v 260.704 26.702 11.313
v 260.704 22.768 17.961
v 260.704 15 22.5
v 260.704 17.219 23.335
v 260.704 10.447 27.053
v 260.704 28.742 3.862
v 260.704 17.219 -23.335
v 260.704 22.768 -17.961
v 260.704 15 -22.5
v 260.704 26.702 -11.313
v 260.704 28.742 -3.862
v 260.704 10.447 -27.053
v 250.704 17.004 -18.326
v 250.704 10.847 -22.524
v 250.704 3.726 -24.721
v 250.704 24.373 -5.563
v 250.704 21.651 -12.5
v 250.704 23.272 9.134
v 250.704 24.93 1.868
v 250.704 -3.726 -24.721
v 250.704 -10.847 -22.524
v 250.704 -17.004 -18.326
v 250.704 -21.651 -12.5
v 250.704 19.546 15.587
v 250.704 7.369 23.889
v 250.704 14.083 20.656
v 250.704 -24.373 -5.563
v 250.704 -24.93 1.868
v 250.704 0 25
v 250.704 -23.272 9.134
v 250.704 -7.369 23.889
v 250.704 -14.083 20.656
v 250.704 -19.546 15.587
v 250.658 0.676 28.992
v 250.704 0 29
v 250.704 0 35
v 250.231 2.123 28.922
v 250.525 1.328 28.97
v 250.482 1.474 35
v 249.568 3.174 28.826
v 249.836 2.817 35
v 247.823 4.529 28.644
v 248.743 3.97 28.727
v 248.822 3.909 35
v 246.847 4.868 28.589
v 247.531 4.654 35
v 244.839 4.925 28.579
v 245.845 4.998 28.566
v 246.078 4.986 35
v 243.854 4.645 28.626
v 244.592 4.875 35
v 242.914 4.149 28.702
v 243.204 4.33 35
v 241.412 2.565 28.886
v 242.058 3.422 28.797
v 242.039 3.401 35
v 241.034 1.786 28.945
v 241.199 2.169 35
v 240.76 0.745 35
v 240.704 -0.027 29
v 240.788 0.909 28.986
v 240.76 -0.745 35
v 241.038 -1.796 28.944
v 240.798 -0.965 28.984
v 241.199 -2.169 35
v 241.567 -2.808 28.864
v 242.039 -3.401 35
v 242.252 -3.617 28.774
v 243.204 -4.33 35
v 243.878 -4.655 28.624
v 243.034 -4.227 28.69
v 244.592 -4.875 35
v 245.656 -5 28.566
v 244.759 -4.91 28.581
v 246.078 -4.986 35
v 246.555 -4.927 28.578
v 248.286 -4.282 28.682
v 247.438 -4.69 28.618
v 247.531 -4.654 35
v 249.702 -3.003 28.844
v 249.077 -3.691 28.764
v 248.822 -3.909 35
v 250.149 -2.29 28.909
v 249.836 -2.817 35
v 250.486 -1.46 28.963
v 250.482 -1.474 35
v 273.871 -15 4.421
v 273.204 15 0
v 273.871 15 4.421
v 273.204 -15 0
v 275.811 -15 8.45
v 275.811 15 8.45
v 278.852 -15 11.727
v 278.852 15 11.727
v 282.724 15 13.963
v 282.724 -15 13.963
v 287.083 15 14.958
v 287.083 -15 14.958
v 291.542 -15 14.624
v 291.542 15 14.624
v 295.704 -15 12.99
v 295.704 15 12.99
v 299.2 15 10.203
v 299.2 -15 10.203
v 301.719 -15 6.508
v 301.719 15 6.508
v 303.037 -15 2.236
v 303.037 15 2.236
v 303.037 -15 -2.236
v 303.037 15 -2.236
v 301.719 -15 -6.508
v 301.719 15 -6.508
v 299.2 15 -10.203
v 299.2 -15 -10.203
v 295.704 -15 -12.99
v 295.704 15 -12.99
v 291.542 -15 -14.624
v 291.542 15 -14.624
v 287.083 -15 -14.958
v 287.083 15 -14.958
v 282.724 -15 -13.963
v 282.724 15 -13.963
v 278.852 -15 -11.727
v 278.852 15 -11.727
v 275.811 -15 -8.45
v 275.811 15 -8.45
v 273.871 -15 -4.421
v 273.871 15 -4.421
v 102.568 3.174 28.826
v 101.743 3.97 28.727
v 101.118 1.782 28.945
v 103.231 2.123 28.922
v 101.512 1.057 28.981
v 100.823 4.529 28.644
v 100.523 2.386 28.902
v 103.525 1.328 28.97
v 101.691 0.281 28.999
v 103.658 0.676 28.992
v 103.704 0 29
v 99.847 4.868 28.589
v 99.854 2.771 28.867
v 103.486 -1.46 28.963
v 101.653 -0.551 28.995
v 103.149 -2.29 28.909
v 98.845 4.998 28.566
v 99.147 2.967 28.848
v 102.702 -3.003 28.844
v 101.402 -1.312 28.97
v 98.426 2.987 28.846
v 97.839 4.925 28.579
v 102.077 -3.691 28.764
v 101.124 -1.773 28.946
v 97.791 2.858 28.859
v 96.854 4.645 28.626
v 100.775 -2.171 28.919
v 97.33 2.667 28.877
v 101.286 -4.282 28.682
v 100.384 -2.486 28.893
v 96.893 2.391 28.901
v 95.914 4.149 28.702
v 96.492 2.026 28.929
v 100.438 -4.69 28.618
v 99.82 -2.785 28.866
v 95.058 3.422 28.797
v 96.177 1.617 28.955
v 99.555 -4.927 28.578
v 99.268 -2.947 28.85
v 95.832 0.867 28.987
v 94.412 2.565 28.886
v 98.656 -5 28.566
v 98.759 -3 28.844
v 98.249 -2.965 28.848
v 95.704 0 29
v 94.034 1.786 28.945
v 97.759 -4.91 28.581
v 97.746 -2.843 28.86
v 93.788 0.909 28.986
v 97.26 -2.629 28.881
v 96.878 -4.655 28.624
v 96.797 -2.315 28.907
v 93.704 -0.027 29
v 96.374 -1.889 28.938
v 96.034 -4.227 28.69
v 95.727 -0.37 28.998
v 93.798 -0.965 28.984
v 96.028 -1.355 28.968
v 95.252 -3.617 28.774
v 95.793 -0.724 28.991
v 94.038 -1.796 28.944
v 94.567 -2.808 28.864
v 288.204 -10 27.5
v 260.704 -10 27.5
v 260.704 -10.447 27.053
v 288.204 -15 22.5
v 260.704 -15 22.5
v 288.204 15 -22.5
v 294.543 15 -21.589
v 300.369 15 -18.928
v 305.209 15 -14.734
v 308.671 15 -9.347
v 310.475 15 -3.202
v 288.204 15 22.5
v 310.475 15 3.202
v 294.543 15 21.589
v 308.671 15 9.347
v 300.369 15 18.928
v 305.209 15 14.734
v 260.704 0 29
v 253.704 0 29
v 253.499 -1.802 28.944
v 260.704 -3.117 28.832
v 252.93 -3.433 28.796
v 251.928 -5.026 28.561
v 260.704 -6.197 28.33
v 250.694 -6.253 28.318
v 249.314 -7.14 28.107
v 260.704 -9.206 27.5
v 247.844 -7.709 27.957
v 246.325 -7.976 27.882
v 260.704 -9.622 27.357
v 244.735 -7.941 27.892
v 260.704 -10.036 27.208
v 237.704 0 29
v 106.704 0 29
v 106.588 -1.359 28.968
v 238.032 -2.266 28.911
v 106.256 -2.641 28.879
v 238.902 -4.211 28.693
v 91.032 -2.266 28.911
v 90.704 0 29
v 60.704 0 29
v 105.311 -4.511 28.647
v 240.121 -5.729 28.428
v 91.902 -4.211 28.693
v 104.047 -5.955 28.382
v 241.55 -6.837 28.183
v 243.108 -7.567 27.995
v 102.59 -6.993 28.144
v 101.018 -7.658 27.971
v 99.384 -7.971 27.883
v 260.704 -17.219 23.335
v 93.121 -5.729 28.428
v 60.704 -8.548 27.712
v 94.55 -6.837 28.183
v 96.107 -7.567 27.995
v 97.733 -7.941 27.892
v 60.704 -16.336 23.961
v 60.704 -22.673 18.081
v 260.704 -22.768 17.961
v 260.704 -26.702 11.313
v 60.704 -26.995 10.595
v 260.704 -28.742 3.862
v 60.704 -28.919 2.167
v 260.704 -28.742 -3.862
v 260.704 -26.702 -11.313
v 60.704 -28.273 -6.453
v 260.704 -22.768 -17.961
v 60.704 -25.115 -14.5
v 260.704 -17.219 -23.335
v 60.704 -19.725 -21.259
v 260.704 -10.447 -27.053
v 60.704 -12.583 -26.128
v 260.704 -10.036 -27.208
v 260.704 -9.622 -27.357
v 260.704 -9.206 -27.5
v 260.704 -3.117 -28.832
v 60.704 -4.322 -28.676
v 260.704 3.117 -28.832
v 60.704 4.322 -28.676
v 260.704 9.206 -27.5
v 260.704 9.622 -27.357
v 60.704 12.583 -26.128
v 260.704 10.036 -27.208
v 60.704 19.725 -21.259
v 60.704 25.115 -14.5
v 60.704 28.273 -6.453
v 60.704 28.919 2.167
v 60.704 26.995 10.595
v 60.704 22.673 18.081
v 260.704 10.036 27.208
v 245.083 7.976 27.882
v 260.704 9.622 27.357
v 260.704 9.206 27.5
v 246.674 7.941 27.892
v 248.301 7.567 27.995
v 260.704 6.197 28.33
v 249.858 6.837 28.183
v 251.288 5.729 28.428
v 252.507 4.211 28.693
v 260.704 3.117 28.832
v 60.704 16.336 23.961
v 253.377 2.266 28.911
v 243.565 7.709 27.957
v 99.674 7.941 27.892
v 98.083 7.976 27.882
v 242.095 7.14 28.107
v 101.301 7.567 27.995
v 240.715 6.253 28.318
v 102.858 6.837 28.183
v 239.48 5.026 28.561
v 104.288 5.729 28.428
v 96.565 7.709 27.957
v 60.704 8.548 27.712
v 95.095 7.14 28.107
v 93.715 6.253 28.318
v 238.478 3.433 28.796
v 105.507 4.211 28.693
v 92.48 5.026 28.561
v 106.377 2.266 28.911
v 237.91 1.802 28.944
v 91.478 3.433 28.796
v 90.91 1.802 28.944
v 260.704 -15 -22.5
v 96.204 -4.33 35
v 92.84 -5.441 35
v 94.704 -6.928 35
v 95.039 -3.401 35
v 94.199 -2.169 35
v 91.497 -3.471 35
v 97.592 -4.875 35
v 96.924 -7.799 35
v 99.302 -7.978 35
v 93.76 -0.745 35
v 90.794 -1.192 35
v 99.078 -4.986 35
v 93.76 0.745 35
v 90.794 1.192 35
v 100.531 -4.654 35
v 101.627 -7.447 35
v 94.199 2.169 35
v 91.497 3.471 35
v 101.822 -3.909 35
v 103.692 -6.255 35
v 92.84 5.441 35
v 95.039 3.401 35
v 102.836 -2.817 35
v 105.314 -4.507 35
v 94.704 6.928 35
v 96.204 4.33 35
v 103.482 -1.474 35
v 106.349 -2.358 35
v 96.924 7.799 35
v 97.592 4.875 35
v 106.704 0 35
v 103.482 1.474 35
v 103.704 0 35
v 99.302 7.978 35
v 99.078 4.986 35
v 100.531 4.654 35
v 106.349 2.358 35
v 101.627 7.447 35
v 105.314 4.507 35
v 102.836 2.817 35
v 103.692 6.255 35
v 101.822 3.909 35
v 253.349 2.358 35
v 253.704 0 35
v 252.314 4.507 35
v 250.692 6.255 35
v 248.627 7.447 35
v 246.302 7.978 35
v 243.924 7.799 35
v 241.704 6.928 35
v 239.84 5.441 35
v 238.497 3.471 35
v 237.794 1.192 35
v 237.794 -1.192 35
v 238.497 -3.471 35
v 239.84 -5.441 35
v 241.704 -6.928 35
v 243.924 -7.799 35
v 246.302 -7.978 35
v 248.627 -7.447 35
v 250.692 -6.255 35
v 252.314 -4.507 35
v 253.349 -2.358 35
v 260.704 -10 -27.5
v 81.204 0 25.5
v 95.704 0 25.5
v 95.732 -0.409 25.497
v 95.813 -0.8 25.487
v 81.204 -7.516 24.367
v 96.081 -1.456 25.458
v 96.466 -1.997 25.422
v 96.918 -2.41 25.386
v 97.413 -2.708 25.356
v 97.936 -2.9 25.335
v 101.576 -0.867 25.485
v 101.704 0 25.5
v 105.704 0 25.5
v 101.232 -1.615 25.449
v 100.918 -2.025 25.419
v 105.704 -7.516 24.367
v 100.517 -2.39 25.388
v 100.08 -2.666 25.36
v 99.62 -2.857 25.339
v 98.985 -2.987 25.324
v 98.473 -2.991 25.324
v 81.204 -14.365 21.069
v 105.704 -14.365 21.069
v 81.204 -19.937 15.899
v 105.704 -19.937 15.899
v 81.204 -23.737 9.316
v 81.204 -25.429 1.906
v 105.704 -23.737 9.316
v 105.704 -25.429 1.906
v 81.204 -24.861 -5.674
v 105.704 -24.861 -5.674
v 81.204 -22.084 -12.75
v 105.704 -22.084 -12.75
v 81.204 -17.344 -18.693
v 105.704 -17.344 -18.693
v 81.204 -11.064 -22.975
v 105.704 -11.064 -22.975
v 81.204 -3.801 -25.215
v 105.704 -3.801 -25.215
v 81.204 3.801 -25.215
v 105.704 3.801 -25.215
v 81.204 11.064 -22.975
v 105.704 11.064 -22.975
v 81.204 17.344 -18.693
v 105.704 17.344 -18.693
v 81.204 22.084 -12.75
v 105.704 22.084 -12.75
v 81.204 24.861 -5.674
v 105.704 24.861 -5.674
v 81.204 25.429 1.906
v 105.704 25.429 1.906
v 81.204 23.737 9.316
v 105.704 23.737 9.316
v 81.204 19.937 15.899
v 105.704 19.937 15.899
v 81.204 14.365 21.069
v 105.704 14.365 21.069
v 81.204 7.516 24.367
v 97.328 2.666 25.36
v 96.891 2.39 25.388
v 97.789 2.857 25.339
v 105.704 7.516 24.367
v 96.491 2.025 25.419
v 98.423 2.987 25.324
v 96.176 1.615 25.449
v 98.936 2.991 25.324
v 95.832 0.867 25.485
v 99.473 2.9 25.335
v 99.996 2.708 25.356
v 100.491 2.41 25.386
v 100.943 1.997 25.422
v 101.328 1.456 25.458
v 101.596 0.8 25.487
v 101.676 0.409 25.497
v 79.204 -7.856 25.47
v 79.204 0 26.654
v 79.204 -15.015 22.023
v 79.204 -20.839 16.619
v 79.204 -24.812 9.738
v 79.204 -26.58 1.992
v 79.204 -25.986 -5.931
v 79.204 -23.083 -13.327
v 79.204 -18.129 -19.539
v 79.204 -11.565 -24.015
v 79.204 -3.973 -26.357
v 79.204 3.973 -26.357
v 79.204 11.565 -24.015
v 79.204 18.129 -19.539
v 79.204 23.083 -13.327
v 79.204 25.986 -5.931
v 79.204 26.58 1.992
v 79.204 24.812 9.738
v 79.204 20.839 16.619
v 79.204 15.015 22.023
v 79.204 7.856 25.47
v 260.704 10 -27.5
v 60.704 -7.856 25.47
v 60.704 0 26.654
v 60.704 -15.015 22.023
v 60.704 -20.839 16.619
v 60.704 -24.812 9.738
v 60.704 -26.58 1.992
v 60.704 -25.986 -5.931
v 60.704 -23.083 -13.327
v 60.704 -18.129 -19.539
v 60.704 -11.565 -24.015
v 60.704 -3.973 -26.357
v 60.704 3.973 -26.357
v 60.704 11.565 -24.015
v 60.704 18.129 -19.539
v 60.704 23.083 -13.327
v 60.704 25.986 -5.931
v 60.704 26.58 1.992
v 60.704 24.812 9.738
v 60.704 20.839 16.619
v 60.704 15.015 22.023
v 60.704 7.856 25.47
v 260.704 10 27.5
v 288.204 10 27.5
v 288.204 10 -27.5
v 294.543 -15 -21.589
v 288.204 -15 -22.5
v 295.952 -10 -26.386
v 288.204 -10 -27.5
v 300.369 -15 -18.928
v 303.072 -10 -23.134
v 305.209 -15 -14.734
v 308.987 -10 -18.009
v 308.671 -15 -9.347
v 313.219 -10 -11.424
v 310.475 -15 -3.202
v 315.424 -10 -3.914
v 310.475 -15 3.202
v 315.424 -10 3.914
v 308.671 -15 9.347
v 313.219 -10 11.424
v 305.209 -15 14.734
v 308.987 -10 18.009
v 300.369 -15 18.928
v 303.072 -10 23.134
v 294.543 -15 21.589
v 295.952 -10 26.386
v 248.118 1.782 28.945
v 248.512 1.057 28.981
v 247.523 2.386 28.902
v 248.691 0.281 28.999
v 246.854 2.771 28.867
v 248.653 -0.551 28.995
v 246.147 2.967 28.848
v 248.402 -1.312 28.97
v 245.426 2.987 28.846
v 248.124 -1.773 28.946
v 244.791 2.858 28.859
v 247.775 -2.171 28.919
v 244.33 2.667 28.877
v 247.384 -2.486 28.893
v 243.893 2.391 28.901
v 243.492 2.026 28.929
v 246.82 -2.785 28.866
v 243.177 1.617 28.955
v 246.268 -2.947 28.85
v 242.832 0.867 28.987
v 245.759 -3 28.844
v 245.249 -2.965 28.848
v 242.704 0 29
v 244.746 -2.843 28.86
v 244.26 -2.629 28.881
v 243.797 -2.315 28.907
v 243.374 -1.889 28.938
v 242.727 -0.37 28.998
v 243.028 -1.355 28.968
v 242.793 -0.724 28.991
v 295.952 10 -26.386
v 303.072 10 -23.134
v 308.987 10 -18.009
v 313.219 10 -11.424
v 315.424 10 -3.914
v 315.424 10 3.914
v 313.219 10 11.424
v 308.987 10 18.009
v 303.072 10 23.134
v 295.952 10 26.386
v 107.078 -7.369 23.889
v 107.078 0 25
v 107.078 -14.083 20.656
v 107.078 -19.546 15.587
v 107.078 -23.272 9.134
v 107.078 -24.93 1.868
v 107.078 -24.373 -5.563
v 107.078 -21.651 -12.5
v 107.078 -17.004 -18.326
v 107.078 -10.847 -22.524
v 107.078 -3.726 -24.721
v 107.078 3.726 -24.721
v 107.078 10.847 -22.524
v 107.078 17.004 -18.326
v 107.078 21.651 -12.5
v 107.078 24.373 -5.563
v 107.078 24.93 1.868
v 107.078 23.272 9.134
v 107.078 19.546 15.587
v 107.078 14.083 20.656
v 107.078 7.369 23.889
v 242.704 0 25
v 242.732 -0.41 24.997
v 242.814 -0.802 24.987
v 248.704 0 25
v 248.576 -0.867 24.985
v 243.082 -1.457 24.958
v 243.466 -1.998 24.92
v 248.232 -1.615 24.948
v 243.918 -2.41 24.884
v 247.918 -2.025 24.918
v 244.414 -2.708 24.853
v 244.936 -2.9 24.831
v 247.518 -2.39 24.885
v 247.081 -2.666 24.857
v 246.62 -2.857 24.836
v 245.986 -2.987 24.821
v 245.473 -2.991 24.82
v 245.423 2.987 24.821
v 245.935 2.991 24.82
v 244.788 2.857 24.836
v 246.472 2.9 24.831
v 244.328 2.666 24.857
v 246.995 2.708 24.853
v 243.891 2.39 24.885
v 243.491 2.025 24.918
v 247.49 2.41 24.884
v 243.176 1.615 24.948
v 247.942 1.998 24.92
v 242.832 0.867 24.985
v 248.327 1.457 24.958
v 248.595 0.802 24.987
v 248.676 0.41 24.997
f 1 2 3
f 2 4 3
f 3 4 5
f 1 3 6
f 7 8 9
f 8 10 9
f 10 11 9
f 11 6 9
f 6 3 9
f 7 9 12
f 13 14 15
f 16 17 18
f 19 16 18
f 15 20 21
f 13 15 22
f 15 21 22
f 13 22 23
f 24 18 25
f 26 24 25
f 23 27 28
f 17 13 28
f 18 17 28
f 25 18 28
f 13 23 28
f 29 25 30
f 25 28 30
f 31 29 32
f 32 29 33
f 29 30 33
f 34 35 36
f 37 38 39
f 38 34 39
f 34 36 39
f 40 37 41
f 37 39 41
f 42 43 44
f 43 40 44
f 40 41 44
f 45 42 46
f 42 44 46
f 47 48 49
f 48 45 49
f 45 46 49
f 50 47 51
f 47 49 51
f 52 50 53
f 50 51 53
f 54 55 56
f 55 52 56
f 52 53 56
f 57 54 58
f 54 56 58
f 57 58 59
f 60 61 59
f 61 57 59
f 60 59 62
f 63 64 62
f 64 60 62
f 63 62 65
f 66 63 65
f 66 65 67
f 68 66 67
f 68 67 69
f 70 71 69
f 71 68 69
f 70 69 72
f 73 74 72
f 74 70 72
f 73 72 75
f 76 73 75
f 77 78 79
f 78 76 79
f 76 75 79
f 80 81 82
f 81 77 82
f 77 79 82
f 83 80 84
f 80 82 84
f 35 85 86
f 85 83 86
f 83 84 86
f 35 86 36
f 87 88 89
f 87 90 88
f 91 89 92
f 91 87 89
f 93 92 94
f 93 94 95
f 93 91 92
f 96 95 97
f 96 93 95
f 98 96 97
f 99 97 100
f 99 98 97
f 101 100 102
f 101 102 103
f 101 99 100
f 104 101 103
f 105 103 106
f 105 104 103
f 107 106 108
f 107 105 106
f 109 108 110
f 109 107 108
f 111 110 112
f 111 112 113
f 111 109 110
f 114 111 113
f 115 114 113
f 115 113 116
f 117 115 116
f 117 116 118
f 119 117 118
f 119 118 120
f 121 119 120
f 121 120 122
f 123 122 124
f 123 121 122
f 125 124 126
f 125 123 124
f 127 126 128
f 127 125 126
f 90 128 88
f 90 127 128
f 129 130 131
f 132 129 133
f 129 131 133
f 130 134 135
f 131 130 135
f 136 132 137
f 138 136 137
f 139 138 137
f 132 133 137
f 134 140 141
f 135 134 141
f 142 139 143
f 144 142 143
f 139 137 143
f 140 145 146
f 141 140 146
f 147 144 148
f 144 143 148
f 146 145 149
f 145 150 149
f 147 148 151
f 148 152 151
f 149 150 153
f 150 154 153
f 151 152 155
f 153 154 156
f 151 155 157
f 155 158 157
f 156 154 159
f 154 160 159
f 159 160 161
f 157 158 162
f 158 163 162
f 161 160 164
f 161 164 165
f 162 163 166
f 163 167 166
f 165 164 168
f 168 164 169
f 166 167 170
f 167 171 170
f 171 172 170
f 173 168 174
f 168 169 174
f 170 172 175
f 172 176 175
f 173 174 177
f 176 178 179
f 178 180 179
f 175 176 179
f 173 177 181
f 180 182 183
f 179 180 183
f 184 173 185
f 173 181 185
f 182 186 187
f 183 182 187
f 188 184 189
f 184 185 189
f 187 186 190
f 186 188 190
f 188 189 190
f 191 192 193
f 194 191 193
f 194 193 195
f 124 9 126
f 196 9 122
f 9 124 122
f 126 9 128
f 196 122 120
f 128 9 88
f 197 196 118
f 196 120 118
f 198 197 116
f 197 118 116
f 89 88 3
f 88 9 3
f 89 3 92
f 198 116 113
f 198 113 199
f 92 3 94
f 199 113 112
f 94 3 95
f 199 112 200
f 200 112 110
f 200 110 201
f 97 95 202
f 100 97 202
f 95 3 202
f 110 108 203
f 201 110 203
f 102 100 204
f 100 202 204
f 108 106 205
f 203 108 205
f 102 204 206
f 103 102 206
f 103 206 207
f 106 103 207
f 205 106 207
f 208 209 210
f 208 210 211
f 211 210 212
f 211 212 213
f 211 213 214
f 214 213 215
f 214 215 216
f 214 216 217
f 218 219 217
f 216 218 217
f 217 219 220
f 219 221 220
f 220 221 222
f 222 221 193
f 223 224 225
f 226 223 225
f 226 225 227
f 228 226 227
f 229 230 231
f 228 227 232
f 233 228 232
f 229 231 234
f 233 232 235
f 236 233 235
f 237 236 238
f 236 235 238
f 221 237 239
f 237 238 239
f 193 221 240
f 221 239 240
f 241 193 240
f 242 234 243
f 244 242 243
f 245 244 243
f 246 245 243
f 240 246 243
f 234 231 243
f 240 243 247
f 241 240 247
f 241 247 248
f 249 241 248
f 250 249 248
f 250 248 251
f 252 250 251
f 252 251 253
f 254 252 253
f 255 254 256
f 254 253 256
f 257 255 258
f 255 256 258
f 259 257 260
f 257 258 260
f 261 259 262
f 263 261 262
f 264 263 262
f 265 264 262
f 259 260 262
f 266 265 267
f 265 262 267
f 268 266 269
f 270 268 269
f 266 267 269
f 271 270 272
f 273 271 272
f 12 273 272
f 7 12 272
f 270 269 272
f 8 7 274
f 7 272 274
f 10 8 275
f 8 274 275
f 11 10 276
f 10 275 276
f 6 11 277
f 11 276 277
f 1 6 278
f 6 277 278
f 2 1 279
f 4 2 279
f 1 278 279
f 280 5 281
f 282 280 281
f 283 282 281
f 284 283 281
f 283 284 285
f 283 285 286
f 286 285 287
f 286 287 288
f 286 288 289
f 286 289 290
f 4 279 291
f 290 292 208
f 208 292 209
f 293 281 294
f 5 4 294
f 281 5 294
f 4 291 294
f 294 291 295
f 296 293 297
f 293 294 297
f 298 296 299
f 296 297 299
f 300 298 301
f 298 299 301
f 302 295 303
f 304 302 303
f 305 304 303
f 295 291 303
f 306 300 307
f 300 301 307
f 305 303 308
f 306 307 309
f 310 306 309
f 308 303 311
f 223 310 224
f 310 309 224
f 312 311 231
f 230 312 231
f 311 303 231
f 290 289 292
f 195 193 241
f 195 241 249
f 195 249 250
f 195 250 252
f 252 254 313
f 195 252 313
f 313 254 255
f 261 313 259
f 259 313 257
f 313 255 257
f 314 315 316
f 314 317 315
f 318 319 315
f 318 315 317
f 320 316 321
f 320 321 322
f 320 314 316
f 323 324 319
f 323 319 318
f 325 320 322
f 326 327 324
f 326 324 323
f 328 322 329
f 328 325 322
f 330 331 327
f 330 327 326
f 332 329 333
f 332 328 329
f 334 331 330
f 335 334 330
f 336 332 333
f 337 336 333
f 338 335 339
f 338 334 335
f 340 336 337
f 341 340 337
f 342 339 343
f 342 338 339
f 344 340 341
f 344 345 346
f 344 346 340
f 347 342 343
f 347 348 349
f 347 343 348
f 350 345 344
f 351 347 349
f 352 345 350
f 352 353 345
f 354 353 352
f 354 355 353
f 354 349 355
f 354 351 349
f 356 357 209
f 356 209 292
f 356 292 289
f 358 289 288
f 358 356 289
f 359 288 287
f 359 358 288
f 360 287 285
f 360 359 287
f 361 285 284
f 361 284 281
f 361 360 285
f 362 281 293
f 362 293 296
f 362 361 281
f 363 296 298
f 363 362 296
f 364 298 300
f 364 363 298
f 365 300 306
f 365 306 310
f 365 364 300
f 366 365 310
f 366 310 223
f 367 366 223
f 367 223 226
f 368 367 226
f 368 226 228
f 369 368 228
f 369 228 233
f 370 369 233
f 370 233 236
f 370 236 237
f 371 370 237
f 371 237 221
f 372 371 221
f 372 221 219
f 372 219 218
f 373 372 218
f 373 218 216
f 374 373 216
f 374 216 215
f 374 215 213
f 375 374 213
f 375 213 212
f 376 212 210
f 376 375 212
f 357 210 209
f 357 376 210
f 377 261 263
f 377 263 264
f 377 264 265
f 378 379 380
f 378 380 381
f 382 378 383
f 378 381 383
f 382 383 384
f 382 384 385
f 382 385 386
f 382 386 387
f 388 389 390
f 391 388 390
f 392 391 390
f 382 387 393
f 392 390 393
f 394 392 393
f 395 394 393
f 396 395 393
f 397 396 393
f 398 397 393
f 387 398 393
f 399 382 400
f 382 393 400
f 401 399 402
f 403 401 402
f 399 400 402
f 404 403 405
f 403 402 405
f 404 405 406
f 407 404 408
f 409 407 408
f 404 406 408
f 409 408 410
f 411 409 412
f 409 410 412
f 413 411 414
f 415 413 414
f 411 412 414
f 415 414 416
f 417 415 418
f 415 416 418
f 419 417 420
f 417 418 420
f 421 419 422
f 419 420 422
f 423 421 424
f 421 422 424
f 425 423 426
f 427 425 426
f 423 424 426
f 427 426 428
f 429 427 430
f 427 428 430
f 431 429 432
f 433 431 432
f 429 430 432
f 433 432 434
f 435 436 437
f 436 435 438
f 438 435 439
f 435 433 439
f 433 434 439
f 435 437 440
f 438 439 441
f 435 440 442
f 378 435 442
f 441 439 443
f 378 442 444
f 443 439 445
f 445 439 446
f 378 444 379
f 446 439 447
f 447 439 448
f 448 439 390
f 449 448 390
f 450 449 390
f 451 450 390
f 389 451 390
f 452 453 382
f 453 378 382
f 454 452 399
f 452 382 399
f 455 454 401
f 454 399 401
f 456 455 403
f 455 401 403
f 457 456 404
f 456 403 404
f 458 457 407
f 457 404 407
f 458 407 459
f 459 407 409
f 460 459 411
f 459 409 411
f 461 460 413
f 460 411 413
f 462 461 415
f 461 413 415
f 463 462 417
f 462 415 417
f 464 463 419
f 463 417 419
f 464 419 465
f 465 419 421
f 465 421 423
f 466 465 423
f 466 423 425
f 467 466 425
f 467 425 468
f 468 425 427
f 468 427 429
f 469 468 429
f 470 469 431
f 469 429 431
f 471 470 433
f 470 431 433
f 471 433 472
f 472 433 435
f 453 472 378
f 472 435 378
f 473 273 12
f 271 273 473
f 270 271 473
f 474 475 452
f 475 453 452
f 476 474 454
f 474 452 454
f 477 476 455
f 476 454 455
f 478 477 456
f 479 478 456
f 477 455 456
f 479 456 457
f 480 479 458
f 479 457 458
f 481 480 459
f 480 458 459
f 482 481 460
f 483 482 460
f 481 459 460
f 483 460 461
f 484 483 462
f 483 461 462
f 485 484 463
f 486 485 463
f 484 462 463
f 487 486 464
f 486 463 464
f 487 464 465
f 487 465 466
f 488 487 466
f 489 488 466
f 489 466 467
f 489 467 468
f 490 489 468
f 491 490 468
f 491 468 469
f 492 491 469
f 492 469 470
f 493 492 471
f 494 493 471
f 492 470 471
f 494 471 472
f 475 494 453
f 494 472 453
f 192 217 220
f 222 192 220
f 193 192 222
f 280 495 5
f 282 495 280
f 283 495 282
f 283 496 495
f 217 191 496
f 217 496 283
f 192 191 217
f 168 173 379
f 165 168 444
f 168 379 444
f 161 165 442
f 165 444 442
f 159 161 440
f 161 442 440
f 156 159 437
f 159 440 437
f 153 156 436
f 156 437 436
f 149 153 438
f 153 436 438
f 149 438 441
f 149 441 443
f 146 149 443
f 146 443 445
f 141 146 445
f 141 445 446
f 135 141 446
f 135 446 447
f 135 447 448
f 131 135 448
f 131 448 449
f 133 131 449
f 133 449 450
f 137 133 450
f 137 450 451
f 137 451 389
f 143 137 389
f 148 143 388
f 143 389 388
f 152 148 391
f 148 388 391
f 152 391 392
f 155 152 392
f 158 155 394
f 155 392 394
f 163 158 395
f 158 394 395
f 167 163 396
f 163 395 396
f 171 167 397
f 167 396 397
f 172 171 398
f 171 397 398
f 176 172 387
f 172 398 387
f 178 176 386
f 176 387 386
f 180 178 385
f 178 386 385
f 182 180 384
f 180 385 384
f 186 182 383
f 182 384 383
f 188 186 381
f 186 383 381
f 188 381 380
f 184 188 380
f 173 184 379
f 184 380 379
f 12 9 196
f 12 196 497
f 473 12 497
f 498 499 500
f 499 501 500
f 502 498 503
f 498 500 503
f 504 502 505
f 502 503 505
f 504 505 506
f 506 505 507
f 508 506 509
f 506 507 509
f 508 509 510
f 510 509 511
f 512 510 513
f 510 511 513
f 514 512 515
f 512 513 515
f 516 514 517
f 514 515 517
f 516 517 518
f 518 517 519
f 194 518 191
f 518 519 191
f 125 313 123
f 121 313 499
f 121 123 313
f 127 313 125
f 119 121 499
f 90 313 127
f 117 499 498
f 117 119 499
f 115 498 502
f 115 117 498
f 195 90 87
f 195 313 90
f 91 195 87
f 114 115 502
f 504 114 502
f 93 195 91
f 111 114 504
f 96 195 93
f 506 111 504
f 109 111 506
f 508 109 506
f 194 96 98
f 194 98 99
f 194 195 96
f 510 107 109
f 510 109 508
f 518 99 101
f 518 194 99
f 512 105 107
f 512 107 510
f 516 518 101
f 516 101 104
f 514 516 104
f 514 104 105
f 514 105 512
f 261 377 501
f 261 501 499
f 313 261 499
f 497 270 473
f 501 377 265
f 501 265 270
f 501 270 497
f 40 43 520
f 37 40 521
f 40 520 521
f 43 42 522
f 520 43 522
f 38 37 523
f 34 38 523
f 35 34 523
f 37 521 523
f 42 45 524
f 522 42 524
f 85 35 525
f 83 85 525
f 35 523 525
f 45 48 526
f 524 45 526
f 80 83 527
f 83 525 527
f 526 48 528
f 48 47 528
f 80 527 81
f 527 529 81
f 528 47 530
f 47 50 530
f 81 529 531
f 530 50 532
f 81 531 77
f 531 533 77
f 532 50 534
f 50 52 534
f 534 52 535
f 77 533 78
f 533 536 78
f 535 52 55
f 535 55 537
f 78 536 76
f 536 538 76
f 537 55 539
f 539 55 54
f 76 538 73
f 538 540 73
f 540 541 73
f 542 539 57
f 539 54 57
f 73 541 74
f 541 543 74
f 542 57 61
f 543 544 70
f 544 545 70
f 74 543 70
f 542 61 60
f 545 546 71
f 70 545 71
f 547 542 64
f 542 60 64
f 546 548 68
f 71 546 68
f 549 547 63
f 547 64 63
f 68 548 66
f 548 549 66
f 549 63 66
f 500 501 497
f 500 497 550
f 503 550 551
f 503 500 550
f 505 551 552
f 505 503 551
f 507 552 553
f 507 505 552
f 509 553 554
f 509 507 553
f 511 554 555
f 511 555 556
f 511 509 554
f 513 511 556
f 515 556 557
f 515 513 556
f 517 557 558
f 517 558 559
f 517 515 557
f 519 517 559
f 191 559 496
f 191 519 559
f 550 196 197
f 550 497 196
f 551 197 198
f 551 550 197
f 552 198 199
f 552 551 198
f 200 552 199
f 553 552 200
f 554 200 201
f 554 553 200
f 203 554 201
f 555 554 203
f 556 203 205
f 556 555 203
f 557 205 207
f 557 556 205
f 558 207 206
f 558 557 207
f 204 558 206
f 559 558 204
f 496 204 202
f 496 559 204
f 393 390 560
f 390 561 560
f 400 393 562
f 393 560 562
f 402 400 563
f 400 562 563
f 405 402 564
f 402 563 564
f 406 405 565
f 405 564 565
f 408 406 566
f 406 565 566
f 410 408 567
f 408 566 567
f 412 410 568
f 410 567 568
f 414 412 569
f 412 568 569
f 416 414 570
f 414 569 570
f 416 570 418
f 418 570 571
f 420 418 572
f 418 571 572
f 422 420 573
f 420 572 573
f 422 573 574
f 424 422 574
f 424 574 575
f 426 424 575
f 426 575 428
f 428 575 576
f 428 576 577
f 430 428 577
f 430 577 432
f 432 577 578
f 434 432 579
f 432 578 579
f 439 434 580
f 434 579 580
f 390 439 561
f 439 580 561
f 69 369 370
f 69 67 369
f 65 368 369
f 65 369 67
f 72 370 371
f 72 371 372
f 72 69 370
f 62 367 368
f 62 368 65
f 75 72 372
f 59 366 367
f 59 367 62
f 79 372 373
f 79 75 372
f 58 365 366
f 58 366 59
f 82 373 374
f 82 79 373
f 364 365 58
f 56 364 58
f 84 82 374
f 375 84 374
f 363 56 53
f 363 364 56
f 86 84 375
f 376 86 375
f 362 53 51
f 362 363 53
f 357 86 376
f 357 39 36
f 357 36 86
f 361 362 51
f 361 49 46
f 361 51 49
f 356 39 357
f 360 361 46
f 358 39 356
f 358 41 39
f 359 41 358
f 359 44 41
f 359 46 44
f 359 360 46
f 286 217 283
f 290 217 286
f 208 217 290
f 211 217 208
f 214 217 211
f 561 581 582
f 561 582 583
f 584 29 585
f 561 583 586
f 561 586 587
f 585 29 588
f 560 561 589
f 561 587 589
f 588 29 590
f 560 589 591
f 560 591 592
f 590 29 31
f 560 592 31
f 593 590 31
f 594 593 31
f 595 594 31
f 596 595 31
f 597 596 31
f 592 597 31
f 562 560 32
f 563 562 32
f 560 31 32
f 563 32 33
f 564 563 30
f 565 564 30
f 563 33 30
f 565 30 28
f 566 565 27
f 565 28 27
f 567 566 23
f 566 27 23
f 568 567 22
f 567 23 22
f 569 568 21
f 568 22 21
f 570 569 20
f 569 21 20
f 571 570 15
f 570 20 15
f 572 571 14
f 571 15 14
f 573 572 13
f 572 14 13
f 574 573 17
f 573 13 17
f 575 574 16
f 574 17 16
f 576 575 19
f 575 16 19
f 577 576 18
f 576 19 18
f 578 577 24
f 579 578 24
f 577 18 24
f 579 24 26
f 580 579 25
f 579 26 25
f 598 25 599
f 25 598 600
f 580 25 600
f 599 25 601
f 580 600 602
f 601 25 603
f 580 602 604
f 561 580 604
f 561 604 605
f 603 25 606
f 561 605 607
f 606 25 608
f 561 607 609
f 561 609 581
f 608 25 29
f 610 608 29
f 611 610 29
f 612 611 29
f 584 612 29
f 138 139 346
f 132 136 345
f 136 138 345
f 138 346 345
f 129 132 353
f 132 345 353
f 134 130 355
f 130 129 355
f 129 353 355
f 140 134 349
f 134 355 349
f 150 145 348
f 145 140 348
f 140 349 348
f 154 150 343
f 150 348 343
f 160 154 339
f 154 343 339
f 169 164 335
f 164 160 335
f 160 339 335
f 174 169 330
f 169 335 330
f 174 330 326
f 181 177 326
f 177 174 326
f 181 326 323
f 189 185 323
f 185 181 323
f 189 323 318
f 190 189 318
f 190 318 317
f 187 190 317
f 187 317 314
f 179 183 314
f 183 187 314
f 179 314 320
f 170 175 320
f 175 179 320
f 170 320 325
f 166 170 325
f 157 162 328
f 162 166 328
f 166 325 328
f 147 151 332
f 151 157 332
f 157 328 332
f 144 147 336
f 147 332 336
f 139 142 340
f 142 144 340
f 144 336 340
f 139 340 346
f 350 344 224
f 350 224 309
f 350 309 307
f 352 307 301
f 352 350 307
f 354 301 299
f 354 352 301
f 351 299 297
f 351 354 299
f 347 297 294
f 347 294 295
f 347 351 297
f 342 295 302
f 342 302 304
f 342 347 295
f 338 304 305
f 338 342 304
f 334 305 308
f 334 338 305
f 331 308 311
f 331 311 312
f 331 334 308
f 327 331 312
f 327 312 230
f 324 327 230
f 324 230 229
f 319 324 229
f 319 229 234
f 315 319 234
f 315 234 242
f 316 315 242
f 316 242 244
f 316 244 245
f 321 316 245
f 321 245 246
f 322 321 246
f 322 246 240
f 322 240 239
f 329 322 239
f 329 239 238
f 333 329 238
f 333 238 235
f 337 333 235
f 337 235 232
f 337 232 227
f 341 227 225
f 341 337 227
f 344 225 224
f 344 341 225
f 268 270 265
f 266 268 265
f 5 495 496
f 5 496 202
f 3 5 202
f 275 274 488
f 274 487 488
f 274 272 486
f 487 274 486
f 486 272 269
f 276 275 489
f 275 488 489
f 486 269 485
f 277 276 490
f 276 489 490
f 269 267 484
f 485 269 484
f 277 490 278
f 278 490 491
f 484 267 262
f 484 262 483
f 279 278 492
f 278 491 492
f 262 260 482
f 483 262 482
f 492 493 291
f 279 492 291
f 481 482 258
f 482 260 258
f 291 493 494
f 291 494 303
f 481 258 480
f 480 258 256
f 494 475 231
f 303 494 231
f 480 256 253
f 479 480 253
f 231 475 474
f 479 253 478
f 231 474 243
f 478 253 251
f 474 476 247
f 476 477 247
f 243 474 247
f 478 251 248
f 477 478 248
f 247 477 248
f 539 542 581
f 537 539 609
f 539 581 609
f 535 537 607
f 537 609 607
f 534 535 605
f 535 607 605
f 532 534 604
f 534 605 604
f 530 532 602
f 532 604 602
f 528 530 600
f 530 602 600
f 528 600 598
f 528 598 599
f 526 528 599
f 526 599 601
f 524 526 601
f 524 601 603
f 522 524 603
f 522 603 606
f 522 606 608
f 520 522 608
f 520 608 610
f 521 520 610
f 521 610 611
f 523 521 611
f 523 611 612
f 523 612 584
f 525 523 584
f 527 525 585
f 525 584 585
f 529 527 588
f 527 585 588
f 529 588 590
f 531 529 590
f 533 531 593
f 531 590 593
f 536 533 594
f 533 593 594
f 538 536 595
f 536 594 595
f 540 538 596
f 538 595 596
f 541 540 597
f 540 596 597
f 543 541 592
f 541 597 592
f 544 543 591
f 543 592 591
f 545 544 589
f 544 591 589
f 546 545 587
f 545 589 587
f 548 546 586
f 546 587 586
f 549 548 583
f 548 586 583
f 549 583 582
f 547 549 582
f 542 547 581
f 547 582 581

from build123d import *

# Parameters (mm, degrees)
F4_DEPTH    = 15
F5_T1_DEPTH = 27.5
F5_T4_ANGLE = 180
F5_T6_ANGLE = 180
F7_R        = 8
F7_R_2      = 5
F9_D        = 6
F9_DEPTH    = 20
F9_START    = 6.1555899
F9_TIP      = 1.8025818571
F10_D       = 6
F10_DEPTH   = 20
F10_START   = 6.1555899
F10_TIP     = 1.8025818571


# Not quite as in the source:
# - a fillet or chamfer that OpenCascade refuses, or shapes differently, is made with other operations: its cross-section is extruded or revolved along the edge and cut away or added


with BuildPart() as f3:
    # F2 (on Front) → F3 (revolve)
    with BuildSketch(Plane.XZ):
        Polygon((105.0486442498, 29), (98.7043133404, 29), (98.7043133404, 25.5), (105.7043133404, 25.5), (107.0780520501, 25), (250.7043133404, 25), (250.7043133404, 0), (260.7043133404, 0), (260.7043133404, 27.5), (260.7043133404, 29), align=None)
        Polygon((92.3599824309, 29), (60.7043133404, 29), (60.7043133404, 26.6542383736), (79.2043133404, 26.6542383736), (81.2035128474, 25.5), (98.7043133404, 25.5), (98.7043133404, 29), align=None)
    revolve(axis=Axis((125.4885941744, 0, 0), (1, 0, 0)))

    # F2 (on Front) → F4 (join, symmetric)
    with BuildSketch(Plane.XZ):
        with BuildLine():
            Line((288.2043133404, 27.5), (260.7043133404, 27.5))
            Line((260.7043133404, 27.5), (260.7043133404, 0))
            Line((260.7043133404, 0), (260.7043133404, -27.5))
            Line((260.7043133404, -27.5), (288.2043133404, -27.5))
            ThreePointArc((288.2043133404, -27.5), (315.7043133404, 0), (288.2043133404, 27.5))
        make_face()
        with BuildLine():
            ThreePointArc((303.2043133404, 0), (288.2043133404, -15), (273.2043133404, 0))
            ThreePointArc((273.2043133404, 0), (288.2043133404, 15), (303.2043133404, 0))
        make_face(mode=Mode.SUBTRACT)
    extrude(amount=F4_DEPTH, both=True)

    # F5: chamfer of 5 on 6 edges, made by hand

    # F5_s2 → F5_t1 (cut)
    with BuildSketch(Plane.YZ.offset(260.7043133404)):
        Polygon((-10, 27.5), (-15, 22.5), (-15, 27.5), align=None)
        Polygon((10, 27.5), (15, 22.5), (15, 27.5), align=None)
        Polygon((15, -22.5), (10, -27.5), (15, -27.5), align=None)
        Polygon((-10, -27.5), (-15, -22.5), (-15, -27.5), align=None)
    extrude(amount=F5_T1_DEPTH, mode=Mode.SUBTRACT)

    # F5_s3 → F5_t4 (revolve, cut)
    with BuildSketch(Plane.YZ.offset(288.2043133404)):
        Polygon((15, -22.5), (10, -27.5), (15, -27.5), align=None)
    revolve(axis=Axis((288.2043133404, 15, 0), (0, -1, 0)), revolution_arc=F5_T4_ANGLE, mode=Mode.SUBTRACT)

    # F5_s5 → F5_t6 (revolve, cut)
    with BuildSketch(Plane.YZ.offset(288.2043133404)):
        Polygon((-15, -22.5), (-10, -27.5), (-15, -27.5), align=None)
    revolve(axis=Axis((288.2043133404, -15, 0), (0, -1, 0)), revolution_arc=F5_T6_ANGLE, mode=Mode.SUBTRACT)

    # F7 (on offset) → F8 (join, up to the next surface of F3)
    with BuildSketch(Plane.XY.offset(35)):
        with Locations((98.7043133404, 0)):
            Circle(F7_R)
        with Locations((98.7043133404, 0)):
            Circle(F7_R_2, mode=Mode.SUBTRACT)
        with Locations((245.7043133404, 0)):
            Circle(F7_R)
        with Locations((245.7043133404, 0)):
            Circle(F7_R_2, mode=Mode.SUBTRACT)
    extrude(until=Until.NEXT, dir=(0, 0, -1))

    # F9
    # its depths count from where the whole tool has entered the part; down to there all is cleared
    with Locations(Plane.XY.offset(35).offset(-F9_START)):
        with Locations((98.7043133404, 0)):
            Hole(F9_D / 2, depth=F9_DEPTH)
            with Locations((0, 0, -(F9_DEPTH + F9_TIP / 2))):  # 118° drill point
                Cone(0, F9_D / 2, F9_TIP, mode=Mode.SUBTRACT)

    # F10
    # its depths count from where the whole tool has entered the part; down to there all is cleared
    with Locations(Plane.XY.offset(35).offset(-F10_START)):
        with Locations((245.7043133404, 0)):
            Hole(F10_D / 2, depth=F10_DEPTH)
            with Locations((0, 0, -(F10_DEPTH + F10_TIP / 2))):  # 118° drill point
                Cone(0, F10_D / 2, F10_TIP, mode=Mode.SUBTRACT)


solid = f3.part
